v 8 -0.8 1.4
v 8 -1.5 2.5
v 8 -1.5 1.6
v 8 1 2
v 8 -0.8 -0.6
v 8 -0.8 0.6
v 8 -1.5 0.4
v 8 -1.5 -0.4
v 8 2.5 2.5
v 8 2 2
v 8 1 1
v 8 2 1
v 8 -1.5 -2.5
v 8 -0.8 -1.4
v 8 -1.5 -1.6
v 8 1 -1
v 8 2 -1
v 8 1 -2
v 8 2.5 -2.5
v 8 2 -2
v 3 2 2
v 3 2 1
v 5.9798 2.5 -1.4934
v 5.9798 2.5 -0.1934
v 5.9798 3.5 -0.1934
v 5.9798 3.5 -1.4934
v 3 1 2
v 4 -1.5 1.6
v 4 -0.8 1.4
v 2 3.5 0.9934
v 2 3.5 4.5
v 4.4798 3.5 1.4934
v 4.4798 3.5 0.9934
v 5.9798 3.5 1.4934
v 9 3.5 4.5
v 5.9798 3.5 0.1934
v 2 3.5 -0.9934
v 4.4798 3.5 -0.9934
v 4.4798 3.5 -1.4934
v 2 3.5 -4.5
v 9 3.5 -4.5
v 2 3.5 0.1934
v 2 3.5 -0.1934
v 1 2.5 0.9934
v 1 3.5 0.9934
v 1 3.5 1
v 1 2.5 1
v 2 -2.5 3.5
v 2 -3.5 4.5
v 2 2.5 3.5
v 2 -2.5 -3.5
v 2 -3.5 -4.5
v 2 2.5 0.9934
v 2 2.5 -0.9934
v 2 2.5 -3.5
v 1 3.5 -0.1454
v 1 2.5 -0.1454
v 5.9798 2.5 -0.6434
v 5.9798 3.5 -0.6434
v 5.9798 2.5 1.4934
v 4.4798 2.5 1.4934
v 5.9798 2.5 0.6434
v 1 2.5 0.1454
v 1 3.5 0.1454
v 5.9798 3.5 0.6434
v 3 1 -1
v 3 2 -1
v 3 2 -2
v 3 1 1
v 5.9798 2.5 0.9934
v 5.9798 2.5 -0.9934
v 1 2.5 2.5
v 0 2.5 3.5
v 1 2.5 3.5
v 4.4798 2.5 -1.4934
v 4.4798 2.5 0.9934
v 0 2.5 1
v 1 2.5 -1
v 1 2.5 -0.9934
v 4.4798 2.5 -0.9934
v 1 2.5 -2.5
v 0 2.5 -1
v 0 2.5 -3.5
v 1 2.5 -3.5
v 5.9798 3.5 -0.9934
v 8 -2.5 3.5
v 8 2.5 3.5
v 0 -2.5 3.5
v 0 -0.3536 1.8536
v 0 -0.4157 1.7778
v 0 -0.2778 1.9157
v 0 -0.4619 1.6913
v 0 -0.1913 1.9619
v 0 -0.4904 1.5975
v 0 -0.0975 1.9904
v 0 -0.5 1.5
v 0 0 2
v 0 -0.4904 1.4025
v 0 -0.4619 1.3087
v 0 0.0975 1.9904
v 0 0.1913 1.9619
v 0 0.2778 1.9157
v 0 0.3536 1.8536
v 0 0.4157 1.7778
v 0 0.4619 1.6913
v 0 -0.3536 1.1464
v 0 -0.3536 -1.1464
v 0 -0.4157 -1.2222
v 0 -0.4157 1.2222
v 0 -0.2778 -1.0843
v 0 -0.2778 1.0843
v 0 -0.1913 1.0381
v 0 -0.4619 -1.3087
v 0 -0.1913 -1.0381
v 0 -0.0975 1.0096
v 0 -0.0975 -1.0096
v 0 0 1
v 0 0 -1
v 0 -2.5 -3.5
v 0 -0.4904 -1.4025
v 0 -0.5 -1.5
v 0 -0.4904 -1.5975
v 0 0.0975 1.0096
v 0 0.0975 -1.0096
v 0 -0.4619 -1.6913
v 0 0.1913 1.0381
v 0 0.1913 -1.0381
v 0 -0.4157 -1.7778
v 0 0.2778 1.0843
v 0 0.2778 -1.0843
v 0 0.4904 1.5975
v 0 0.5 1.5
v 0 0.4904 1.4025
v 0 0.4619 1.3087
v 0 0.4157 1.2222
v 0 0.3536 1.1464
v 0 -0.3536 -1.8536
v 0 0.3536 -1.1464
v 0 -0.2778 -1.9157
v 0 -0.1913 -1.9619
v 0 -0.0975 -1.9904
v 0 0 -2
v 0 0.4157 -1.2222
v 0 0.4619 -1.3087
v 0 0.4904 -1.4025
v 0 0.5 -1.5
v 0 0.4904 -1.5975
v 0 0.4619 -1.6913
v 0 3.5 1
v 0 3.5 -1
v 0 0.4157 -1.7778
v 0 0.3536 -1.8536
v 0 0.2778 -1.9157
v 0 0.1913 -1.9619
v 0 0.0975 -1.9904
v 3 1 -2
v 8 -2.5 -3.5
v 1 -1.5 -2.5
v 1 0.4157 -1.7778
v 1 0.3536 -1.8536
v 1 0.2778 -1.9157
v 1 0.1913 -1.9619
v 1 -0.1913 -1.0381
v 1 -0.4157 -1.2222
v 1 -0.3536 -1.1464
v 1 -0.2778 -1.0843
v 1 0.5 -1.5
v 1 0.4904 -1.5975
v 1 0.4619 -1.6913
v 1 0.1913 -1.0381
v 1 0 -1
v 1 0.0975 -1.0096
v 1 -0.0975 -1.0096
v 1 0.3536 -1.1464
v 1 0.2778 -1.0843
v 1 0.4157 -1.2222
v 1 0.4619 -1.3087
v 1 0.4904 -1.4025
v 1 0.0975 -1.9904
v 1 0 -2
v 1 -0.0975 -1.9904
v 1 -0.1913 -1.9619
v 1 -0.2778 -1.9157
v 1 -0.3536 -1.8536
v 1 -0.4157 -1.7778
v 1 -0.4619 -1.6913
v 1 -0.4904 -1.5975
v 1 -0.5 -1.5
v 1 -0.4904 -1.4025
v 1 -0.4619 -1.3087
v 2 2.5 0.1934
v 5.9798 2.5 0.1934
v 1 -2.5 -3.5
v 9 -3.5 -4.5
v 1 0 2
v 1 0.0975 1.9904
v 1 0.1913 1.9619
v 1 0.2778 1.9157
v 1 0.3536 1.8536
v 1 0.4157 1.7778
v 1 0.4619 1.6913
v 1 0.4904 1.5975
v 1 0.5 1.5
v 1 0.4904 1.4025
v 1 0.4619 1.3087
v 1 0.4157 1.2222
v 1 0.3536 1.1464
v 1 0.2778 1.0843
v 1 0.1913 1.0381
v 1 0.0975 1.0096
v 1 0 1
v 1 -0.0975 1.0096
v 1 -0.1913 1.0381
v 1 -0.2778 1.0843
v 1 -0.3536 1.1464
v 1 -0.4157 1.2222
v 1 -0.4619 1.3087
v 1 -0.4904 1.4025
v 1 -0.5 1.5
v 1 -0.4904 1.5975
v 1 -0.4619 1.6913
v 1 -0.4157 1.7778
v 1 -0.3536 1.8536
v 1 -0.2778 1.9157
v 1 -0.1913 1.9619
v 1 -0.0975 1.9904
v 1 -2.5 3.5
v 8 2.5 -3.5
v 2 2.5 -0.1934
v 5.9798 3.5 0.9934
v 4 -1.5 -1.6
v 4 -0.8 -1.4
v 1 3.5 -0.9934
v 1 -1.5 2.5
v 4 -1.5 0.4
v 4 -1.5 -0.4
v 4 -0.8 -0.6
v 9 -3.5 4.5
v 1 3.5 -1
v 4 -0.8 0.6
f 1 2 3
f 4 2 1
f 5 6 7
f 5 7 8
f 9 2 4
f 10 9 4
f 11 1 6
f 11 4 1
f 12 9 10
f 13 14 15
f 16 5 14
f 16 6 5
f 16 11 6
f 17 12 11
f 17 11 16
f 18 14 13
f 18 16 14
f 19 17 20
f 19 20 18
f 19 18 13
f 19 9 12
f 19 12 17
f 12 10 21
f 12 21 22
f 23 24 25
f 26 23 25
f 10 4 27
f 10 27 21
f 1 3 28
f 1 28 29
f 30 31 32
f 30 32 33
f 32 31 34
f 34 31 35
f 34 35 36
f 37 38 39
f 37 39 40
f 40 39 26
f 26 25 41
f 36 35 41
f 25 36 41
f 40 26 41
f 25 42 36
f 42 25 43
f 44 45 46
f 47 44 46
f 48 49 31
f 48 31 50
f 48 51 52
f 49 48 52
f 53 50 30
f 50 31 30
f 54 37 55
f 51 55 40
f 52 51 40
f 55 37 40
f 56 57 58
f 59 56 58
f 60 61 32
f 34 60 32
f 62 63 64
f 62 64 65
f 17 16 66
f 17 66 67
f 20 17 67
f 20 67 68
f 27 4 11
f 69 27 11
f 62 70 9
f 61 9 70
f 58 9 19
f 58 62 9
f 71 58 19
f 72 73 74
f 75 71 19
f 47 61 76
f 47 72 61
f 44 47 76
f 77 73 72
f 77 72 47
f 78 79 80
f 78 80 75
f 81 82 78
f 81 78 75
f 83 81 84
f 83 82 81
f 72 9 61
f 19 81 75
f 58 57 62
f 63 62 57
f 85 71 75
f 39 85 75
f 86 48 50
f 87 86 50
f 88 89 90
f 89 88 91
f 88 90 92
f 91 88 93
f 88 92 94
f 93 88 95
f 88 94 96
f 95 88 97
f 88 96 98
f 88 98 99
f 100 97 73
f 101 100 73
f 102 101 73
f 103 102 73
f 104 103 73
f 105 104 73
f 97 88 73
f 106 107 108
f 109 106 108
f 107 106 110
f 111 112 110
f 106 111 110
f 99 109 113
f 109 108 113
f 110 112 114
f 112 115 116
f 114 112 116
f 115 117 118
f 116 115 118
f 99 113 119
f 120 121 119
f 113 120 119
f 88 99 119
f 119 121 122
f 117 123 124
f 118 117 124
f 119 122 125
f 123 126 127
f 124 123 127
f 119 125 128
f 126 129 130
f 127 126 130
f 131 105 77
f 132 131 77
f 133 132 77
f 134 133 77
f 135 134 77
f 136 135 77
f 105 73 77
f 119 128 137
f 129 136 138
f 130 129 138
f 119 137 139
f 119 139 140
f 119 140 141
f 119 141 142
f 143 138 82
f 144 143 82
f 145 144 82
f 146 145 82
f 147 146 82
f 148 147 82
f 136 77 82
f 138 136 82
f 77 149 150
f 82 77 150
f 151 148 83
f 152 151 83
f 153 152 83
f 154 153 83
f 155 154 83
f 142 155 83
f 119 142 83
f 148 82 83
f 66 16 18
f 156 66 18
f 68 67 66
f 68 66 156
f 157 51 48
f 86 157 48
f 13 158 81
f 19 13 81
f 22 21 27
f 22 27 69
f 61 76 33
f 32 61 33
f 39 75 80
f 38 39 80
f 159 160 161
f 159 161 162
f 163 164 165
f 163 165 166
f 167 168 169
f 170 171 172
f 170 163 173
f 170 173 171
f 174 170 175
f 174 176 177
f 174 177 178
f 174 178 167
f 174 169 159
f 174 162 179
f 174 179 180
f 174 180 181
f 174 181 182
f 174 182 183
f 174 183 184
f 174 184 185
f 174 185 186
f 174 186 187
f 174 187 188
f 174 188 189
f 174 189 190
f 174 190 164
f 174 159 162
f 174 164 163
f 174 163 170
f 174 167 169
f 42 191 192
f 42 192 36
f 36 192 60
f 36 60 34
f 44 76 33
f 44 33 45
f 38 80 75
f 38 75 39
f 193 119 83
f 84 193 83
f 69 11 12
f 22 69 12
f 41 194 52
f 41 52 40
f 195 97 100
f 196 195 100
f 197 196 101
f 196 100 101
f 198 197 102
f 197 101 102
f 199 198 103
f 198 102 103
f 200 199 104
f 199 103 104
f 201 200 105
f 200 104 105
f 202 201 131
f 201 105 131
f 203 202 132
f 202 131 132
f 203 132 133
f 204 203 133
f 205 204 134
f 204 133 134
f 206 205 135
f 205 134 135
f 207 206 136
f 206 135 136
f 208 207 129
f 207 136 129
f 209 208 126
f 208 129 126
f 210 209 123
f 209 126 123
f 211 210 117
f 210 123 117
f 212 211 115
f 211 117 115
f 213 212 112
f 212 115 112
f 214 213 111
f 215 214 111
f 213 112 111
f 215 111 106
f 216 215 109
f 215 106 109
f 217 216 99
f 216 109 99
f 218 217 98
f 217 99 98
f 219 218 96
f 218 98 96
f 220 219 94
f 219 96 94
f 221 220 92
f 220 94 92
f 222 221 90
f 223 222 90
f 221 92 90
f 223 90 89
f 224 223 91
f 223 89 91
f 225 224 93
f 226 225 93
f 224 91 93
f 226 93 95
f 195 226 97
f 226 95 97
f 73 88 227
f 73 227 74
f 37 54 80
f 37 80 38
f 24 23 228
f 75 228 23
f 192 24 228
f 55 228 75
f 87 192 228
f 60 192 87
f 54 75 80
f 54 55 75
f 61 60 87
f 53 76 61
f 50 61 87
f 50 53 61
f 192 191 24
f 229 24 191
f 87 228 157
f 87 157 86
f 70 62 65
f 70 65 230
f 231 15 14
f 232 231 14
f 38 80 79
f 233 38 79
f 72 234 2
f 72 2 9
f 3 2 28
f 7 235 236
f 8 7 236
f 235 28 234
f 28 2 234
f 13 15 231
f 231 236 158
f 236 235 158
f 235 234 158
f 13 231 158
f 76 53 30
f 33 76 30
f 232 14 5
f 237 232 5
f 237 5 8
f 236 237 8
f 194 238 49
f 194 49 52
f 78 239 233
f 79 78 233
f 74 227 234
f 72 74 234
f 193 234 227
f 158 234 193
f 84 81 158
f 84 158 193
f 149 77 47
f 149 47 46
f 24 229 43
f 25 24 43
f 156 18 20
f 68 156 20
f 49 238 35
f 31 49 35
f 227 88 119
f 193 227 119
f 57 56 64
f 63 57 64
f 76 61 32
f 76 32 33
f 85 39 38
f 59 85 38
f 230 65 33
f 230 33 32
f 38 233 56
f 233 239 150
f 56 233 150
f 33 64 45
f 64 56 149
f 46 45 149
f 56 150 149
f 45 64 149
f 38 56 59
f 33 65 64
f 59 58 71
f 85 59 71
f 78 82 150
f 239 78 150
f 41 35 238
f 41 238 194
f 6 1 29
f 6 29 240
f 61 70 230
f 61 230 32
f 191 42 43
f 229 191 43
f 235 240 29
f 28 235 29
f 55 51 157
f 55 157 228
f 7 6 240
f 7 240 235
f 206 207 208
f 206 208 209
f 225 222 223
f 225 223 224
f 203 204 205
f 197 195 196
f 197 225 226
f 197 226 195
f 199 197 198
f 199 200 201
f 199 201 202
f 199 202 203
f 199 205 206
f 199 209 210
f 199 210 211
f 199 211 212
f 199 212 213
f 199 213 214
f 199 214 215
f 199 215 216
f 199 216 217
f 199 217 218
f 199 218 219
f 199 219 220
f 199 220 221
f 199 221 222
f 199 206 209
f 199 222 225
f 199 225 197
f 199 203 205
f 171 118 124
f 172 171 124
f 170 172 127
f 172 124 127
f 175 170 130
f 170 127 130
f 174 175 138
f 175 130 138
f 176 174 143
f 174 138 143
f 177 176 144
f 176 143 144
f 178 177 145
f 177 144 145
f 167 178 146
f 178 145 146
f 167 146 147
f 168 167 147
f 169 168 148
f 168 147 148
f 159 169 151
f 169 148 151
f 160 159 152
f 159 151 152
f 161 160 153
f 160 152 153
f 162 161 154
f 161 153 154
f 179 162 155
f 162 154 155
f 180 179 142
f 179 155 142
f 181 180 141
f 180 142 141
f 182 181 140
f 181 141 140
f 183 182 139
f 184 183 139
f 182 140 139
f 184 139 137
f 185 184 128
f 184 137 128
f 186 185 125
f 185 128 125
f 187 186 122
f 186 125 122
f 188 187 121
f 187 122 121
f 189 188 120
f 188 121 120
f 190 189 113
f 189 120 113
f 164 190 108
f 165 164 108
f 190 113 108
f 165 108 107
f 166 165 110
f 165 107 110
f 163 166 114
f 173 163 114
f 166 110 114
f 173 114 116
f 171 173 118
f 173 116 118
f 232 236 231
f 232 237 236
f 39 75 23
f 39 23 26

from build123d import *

# Parameters (mm, degrees)
SKETCH1_W                = 7
SKETCH1_H                = 5
BOSS_EXTRUDE1_DEPTH      = 1
SKETCH3_W                = 5
SKETCH3_H                = 4
BOSS_EXTRUDE2_DEPTH      = 7
SKETCH4_W                = 1
SKETCH4_H                = 1
CUT_EXTRUDE1_DEPTH       = 5
CUT_EXTRUDE3_DEPTH       = 4
SKETCH7_W                = 2
SKETCH7_H                = 1
BOSS_EXTRUDE3_DEPTH      = 1
SNAP_START               = 2.5
SNAP_HOOK3_DEPTH         = 1
SKETCH8_R                = 0.5
CUT_EXTRUDE4_DEPTH       = 1
SKETCH9_W                = 9
SKETCH9_H                = 7
BOSS_EXTRUDE4_DEPTH      = 7
SKETCH10_W               = 7
SKETCH10_H               = 5
CUT_EXTRUDE5_DEPTH       = 6
SNAP_START_2             = 2
SNAP_GROOVE1_OUTLINE_W   = 1
SNAP_GROOVE1_OUTLINE_H   = 0.8
SNAP_GROOVE1_DEPTH       = 3.979788025
SNAP_START_3             = 4.479788025
SNAP_GROOVE1_2_OUTLINE_W = 1
SNAP_GROOVE1_2_OUTLINE_H = 0.5
SNAP_GROOVE1_2_DEPTH     = 1.5


# Read off the part's stored shape, not the designer's step: Snap Hook3, Snap Groove1
with BuildPart() as part:
    # Sketch1 → Boss-Extrude1 (new body)
    with BuildSketch(Plane(origin=(0, 0, 0), x_dir=(0, 0, -1), z_dir=(1, 0, 0))):
        Rectangle(SKETCH1_W, SKETCH1_H)
    extrude(amount=BOSS_EXTRUDE1_DEPTH)

    # Sketch3 → Boss-Extrude2 (add)
    with BuildSketch(Plane(origin=(1, 0, 0), x_dir=(0, 0, -1), z_dir=(1, 0, 0))):
        with Locations((0, 0.5)):
            Rectangle(SKETCH3_W, SKETCH3_H)
    extrude(amount=BOSS_EXTRUDE2_DEPTH)

    # Sketch4 → Cut-Extrude1 (cut)
    with BuildSketch(Plane(origin=(8, 0, 0), x_dir=(0, 0, -1), z_dir=(1, 0, 0))):
        with Locations((-1.5, 1.5)):
            Rectangle(SKETCH4_W, SKETCH4_H)
        with Locations((1.5, 1.5)):
            Rectangle(SKETCH4_W, SKETCH4_H)
    extrude(amount=-CUT_EXTRUDE1_DEPTH, mode=Mode.SUBTRACT)

    # Sketch6 → Cut-Extrude3 (cut)
    with BuildSketch(Plane(origin=(8, 0, 0), x_dir=(0, 0, -1), z_dir=(1, 0, 0))):
        Polygon((-1.6, -1.5), (-1.4, -0.8), (-0.6, -0.8), (-0.4, -1.5), align=None)
        Polygon((0.4, -1.5), (1.6, -1.5), (1.4, -0.8), (0.6, -0.8), align=None)
    extrude(amount=-CUT_EXTRUDE3_DEPTH, mode=Mode.SUBTRACT)

    # Sketch7 → Boss-Extrude3 (add)
    with BuildSketch(Plane.ZY):
        with Locations((0, 3)):
            Rectangle(SKETCH7_W, SKETCH7_H)
    extrude(amount=-BOSS_EXTRUDE3_DEPTH)

    # Snap Hook3 outline → Snap Hook3 (add)
    with BuildSketch(Plane(origin=(0, 0, 0), x_dir=(1, 0, 0), z_dir=(0, 1, 0)).offset(SNAP_START)):
        Polygon((5.979788025, 0.993352766), (4.479788025, 1.493352766), (4.479788025, 0.993352766), (1, 0.993352766), (1, 0.145373963), (5.979788025, 0.643352766), align=None)
    snap_hook3 = extrude(amount=SNAP_HOOK3_DEPTH)

    # Mirror1: Snap Hook3 across plane
    add(snap_hook3.mirror(Plane.XY))

    # Sketch8 → Cut-Extrude4 (cut)
    with BuildSketch(Plane.ZY):
        with Locations((-1.5, 0)):
            Circle(SKETCH8_R)
        with Locations((1.5, 0)):
            Circle(SKETCH8_R)
    extrude(amount=-CUT_EXTRUDE4_DEPTH, mode=Mode.SUBTRACT)


with BuildPart() as body_2:
    # Sketch9 → Boss-Extrude4 (new body)
    with BuildSketch(Plane(origin=(9, 0, 0), x_dir=(0, 0, -1), z_dir=(1, 0, 0))):
        Rectangle(SKETCH9_W, SKETCH9_H)
    extrude(amount=-BOSS_EXTRUDE4_DEPTH)

    # Sketch10 → Cut-Extrude5 (cut)
    with BuildSketch(Plane.ZY.offset(-2)):
        Rectangle(SKETCH10_W, SKETCH10_H)
    extrude(amount=-CUT_EXTRUDE5_DEPTH, mode=Mode.SUBTRACT)

    # Snap Groove1 outline → Snap Groove1 (cut)
    with BuildSketch(Plane.YZ.offset(SNAP_START_2)):
        with Locations((3, -0.593352766)):
            Rectangle(SNAP_GROOVE1_OUTLINE_W, SNAP_GROOVE1_OUTLINE_H)
    snap_groove1 = extrude(amount=SNAP_GROOVE1_DEPTH, mode=Mode.SUBTRACT)

    # Snap Groove1 2 outline → Snap Groove1 2 (cut)
    with BuildSketch(Plane.YZ.offset(SNAP_START_3)):
        with Locations((3, -1.243352766)):
            Rectangle(SNAP_GROOVE1_2_OUTLINE_W, SNAP_GROOVE1_2_OUTLINE_H)
    snap_groove1_2 = extrude(amount=SNAP_GROOVE1_2_DEPTH, mode=Mode.SUBTRACT)

    # Mirror2: Snap Groove1, Snap Groove1 2 across plane
    add(snap_groove1.mirror(Plane.XY), mode=Mode.SUBTRACT)
    add(snap_groove1_2.mirror(Plane.XY), mode=Mode.SUBTRACT)


solid = Compound([part.part, body_2.part])
